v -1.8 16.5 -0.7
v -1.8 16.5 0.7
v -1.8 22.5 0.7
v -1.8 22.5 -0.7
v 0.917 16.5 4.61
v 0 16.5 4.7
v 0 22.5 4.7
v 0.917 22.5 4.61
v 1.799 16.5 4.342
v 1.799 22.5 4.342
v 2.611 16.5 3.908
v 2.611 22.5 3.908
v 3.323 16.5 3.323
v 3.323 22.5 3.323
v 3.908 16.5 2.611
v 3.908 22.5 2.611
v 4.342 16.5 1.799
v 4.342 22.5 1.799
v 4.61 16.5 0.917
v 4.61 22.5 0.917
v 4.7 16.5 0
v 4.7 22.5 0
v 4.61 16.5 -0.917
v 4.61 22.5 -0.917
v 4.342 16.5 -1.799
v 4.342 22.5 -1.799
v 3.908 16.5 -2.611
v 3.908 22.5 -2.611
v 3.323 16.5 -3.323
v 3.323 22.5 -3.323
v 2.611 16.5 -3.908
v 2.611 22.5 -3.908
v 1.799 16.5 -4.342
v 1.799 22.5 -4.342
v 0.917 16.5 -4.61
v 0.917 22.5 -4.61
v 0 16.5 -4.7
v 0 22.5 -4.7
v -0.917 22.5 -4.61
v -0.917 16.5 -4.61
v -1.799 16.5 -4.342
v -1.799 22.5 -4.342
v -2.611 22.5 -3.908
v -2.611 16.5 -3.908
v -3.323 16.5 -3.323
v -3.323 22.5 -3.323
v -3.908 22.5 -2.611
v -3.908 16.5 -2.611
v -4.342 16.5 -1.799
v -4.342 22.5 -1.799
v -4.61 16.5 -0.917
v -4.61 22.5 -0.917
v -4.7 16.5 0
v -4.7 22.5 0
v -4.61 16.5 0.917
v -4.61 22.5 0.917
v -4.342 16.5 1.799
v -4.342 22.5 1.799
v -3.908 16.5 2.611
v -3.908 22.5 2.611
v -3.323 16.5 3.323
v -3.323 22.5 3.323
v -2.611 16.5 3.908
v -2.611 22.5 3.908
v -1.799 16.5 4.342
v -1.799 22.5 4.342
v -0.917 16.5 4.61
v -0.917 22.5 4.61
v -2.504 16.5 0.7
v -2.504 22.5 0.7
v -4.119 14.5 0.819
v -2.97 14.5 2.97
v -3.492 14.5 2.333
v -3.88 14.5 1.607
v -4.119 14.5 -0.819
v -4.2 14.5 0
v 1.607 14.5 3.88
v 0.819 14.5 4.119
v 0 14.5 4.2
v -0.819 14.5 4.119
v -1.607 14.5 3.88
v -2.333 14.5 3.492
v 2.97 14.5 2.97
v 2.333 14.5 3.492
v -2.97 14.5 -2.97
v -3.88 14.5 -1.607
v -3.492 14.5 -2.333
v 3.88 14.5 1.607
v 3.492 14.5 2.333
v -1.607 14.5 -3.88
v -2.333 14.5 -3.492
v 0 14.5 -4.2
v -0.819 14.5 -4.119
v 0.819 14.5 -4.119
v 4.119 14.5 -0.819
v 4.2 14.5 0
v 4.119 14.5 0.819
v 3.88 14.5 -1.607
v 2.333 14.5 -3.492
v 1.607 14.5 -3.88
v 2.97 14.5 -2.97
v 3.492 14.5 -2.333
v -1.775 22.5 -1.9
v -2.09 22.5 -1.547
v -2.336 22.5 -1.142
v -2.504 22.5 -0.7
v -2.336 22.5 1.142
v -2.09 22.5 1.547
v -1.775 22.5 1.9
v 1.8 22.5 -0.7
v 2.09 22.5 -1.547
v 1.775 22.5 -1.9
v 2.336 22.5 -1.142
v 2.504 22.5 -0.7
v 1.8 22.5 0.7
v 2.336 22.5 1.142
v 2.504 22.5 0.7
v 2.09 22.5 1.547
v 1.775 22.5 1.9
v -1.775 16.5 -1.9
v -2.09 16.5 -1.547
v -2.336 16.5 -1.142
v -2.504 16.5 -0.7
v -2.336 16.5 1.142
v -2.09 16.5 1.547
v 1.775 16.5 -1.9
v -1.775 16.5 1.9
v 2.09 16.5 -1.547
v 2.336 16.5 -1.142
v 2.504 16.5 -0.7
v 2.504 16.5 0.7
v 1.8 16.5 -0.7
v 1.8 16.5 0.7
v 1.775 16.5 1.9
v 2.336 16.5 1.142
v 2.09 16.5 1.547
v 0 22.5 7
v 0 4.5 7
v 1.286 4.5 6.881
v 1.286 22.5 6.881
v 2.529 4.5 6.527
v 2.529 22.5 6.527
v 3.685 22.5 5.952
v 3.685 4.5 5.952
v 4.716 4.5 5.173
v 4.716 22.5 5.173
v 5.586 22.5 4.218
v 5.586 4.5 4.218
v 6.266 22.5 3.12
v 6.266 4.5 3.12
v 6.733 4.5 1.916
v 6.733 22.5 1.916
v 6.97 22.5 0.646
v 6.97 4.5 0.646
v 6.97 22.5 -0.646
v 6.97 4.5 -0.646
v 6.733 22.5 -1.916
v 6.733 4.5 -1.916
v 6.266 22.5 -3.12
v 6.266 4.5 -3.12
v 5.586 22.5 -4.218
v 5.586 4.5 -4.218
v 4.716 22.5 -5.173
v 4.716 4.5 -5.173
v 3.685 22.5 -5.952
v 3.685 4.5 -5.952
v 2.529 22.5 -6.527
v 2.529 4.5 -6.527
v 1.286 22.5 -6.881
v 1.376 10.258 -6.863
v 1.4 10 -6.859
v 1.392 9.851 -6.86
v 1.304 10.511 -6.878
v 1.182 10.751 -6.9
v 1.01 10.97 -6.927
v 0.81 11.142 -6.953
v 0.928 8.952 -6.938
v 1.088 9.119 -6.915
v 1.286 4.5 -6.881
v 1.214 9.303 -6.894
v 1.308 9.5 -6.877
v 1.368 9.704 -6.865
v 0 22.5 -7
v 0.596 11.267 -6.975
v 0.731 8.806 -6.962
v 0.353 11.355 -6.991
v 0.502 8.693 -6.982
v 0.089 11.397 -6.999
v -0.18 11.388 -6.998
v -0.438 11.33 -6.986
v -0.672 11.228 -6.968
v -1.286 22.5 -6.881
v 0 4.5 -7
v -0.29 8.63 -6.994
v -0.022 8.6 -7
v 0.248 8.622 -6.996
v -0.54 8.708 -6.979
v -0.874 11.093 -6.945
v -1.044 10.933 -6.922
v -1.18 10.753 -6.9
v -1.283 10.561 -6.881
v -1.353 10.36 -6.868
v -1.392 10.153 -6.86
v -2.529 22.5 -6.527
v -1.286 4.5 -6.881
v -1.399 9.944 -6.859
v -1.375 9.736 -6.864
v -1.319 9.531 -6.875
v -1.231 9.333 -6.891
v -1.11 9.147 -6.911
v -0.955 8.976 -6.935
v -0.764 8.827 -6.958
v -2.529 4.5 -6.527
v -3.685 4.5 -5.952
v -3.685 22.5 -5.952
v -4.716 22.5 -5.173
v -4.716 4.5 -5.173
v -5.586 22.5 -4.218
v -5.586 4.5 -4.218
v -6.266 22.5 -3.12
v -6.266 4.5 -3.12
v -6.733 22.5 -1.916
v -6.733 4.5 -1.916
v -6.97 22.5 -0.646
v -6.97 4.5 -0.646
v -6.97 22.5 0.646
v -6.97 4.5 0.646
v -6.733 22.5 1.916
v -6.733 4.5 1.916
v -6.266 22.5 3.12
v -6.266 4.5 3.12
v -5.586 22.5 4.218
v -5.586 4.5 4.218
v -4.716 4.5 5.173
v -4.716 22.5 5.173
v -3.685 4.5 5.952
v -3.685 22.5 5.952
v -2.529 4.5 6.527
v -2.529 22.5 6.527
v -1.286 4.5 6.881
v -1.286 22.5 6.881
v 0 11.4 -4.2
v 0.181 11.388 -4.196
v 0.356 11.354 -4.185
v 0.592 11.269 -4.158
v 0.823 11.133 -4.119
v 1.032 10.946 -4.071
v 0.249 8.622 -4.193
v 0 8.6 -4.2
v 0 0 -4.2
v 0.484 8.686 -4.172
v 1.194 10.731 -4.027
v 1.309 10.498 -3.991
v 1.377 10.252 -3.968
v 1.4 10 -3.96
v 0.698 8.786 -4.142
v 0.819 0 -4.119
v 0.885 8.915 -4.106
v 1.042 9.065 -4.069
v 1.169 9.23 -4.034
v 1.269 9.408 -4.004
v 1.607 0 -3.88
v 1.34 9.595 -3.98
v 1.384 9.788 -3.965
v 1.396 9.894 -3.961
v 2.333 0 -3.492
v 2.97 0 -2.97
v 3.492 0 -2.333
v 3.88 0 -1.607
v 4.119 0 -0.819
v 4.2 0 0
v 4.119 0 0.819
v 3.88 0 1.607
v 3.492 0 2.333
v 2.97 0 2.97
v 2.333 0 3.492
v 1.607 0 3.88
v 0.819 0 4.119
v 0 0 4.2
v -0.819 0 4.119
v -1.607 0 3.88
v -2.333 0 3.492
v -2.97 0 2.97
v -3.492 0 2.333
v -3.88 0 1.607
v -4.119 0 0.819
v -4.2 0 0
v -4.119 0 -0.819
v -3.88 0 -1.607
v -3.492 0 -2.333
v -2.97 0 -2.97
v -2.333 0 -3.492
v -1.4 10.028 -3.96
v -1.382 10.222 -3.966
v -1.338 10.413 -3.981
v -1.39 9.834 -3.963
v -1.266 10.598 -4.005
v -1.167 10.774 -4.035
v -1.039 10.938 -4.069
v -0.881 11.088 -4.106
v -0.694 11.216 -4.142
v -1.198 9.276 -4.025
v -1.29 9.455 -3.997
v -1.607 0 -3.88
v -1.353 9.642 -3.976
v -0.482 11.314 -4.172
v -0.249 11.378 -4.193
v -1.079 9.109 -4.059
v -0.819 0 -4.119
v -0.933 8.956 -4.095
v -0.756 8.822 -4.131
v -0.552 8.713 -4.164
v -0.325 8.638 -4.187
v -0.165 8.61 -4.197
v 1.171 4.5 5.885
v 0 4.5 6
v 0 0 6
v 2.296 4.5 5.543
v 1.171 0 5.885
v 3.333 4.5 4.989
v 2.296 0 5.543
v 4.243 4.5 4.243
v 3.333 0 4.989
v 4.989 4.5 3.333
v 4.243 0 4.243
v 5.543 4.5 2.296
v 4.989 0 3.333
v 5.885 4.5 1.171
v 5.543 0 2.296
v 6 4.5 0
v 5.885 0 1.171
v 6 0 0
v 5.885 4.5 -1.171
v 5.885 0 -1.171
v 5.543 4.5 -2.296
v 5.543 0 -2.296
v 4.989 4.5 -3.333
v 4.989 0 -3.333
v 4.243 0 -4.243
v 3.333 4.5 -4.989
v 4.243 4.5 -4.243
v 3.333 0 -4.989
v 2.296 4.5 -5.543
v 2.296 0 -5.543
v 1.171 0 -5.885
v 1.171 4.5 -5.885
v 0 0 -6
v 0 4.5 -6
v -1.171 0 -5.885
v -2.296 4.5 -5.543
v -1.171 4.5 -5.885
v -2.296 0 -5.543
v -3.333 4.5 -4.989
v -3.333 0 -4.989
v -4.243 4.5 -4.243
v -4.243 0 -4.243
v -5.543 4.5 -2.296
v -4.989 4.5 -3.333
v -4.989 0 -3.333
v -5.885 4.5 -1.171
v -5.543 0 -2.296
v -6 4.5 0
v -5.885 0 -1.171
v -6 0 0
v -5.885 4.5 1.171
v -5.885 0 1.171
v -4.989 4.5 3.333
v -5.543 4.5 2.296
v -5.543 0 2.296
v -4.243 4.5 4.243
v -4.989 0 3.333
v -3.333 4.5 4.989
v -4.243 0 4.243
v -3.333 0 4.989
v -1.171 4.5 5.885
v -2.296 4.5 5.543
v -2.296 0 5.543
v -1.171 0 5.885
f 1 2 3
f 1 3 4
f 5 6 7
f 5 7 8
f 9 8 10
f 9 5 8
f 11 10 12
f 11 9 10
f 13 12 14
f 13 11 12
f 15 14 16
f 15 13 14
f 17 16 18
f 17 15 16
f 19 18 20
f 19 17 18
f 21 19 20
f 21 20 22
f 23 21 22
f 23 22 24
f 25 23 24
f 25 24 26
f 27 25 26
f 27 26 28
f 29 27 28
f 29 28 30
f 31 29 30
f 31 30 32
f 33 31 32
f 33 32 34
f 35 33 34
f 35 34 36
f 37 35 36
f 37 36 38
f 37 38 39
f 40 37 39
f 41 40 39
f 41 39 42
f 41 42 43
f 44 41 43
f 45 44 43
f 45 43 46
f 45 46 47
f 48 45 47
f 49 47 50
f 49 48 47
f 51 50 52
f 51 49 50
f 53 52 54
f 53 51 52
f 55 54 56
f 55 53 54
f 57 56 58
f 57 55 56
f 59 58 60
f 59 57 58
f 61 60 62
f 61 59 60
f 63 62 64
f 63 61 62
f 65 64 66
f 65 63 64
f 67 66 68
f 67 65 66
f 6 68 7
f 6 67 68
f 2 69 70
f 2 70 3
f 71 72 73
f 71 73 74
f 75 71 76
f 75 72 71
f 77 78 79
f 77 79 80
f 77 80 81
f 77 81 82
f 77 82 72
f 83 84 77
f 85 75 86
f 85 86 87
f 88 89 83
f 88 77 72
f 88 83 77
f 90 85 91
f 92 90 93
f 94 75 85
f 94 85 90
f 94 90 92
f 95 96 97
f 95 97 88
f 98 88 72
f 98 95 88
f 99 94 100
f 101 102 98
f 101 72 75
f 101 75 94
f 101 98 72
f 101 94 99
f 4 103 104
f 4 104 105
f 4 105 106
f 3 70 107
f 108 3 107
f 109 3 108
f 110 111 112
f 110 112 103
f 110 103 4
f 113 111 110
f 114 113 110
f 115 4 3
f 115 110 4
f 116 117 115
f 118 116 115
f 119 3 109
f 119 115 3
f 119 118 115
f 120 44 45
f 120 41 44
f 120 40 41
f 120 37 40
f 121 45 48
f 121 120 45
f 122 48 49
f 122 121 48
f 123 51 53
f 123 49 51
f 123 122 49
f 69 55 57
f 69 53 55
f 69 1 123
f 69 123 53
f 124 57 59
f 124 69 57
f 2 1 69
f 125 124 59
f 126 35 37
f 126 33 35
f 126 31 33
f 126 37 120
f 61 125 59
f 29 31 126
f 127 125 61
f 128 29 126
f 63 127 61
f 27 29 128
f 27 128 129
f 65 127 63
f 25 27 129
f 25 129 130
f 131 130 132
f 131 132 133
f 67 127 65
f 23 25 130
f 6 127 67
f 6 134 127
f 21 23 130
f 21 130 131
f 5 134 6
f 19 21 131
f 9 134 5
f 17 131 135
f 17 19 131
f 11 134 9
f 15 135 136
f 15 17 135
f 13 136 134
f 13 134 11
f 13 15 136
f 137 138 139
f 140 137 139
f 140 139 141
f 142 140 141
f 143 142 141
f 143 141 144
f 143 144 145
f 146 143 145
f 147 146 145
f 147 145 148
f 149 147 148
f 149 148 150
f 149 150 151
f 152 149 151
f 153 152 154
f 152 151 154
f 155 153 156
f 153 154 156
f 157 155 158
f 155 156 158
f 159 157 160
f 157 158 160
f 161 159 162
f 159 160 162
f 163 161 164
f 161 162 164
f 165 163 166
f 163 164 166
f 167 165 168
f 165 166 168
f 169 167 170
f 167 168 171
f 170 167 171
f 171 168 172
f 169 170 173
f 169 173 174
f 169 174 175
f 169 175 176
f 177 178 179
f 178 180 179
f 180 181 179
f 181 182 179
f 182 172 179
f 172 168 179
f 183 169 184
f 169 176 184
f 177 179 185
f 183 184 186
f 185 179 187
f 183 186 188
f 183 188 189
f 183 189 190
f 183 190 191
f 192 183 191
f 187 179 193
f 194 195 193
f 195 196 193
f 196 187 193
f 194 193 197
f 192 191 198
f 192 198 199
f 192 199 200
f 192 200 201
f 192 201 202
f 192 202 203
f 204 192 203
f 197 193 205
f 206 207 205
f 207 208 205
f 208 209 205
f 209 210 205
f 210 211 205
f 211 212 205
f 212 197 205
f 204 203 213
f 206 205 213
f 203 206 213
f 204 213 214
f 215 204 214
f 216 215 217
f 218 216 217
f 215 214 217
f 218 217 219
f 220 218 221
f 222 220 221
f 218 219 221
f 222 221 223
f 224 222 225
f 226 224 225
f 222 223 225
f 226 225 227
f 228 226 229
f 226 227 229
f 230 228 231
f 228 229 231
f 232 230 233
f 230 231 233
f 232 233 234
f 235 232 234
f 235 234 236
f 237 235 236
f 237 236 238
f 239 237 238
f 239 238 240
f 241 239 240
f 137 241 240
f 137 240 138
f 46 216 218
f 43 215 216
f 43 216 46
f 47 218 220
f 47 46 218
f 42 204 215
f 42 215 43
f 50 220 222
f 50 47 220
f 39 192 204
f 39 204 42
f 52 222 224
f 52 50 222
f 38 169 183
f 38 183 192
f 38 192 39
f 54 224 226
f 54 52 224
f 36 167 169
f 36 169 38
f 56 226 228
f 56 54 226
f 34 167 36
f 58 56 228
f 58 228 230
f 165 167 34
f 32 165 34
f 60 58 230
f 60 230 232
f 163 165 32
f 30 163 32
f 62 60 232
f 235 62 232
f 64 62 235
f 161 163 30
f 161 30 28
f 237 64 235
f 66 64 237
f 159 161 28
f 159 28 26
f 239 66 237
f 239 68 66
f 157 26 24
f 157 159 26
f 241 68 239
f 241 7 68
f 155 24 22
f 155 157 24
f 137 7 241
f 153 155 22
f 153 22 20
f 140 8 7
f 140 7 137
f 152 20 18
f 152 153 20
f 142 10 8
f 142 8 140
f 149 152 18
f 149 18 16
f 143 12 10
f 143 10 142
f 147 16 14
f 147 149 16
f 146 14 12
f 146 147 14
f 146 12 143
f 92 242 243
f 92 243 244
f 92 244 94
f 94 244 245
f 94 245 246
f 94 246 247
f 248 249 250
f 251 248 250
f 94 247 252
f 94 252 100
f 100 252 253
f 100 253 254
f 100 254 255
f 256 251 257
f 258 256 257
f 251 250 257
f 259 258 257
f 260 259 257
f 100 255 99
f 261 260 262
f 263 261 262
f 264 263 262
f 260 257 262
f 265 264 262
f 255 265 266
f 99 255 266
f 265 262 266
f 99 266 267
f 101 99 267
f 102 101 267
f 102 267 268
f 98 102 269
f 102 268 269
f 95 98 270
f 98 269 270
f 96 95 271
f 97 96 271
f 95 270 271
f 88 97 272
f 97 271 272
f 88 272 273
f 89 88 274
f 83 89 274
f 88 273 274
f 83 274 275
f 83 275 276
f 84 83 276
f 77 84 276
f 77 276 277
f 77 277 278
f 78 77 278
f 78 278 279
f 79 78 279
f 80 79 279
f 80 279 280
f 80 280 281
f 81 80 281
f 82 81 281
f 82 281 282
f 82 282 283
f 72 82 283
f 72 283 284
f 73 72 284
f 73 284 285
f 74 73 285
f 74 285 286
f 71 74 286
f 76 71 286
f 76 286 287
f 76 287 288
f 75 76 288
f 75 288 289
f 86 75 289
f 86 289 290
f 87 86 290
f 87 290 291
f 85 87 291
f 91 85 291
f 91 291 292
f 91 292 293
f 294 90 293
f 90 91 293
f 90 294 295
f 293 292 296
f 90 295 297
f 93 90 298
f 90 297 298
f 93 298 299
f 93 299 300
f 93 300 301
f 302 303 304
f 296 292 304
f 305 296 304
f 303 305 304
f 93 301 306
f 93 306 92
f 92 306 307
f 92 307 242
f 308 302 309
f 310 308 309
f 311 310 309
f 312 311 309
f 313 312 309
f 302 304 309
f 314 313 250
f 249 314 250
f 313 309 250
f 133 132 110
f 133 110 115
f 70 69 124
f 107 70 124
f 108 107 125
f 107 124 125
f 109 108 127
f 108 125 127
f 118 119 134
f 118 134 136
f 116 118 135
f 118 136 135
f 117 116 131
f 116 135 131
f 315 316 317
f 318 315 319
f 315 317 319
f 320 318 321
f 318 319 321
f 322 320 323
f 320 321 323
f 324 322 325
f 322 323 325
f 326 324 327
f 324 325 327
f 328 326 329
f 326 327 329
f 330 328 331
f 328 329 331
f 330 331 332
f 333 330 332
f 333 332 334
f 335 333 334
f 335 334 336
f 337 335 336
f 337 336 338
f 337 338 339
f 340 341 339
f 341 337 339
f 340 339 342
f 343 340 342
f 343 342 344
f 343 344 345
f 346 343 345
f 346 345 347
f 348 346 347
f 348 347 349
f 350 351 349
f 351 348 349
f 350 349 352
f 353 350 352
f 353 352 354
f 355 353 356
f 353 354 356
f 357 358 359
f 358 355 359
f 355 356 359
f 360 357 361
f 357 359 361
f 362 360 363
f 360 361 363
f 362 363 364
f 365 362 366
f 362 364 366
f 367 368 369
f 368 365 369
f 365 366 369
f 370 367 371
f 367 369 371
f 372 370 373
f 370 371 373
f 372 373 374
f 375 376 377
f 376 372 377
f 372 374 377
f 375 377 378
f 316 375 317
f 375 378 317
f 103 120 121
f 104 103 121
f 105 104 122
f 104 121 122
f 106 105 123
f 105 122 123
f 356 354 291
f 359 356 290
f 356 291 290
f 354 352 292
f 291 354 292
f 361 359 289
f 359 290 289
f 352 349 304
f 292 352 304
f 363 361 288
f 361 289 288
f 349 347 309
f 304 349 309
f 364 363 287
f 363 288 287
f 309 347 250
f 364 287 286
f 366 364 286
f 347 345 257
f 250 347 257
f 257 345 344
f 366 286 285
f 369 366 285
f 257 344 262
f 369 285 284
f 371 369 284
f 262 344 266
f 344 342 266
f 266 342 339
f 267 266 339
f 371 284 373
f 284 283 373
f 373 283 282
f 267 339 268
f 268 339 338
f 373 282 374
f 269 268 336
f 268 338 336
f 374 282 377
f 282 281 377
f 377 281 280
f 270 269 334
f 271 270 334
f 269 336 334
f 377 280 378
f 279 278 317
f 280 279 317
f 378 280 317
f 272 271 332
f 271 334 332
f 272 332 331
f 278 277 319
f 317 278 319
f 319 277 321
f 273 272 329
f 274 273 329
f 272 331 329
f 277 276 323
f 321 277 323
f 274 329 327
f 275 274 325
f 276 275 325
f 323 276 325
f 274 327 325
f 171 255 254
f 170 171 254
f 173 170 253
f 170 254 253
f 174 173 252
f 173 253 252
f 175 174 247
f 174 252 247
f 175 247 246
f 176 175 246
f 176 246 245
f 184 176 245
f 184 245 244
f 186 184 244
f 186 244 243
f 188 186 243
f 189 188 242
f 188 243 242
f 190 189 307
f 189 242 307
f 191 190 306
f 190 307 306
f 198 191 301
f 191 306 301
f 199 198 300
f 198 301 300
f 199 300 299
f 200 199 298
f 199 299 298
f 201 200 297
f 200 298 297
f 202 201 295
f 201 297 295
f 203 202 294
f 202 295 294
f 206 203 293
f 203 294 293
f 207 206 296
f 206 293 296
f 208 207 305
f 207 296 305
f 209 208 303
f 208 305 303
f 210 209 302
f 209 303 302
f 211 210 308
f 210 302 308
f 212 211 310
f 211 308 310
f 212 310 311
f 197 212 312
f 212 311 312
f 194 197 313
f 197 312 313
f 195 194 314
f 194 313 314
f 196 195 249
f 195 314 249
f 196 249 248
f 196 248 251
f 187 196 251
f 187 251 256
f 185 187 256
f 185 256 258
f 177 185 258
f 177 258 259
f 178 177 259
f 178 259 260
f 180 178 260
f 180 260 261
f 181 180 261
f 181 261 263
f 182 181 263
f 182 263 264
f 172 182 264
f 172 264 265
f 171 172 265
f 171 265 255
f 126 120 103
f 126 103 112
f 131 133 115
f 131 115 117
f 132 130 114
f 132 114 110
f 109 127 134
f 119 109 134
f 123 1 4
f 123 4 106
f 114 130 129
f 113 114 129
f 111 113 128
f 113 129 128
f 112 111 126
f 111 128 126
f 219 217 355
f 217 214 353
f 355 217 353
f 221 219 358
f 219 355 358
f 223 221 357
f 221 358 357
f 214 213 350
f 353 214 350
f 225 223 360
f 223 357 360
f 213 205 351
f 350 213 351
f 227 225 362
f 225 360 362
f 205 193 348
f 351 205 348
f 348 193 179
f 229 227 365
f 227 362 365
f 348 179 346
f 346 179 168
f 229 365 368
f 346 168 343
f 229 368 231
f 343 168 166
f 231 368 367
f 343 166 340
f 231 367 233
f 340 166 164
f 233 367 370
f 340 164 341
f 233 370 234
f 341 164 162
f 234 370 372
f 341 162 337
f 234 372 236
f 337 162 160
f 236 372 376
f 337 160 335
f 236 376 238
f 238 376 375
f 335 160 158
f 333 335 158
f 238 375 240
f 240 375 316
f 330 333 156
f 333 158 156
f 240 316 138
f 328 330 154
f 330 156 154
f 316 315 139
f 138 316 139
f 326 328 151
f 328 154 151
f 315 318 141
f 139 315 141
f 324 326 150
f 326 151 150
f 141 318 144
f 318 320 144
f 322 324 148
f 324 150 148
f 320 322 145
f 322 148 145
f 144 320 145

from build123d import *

# Parameters (mm, degrees)
CROQUIS1_R                   = 6
SALIENTE_EXTRUIR1_DEPTH      = 16.5
CROQUIS2_R                   = 4.2
CORTAR_EXTRUIR1_DEPTH        = 14.5
CROQUIS3_R                   = 2.6
SALIENTE_EXTRUIR2_DEPTH      = 6
CORTAR_EXTRUIR4_START        = -6
CORTAR_EXTRUIR4_DEPTH        = 6
CORTAR_EXTRUIR5_START        = -6
CORTAR_EXTRUIR5_DEPTH        = 6
SALIENTE_EXTRUIR3_DEPTH      = 6
SALIENTE_EXTRUIR3_DEPTH_BACK = 12
CROQUIS13_R                  = 7
CROQUIS13_R_2                = 4.7
CORTAR_EXTRUIR9_REACH        = 26.581
CORTAR_EXTRUIR9_END_RADIUS   = 7
CROQUIS14_R                  = 1.4


with BuildPart() as part:
    # Croquis1 → Saliente-Extruir1 (new body)
    with BuildSketch(Plane(origin=(0, 0, 0), x_dir=(1, 0, 0), z_dir=(0, 1, 0))):
        with Locations(Location((0, 0, 0), (0, 0, 270))):
            Circle(CROQUIS1_R)
    extrude(amount=SALIENTE_EXTRUIR1_DEPTH)

    # Croquis2 → Cortar-Extruir1 (cut)
    with BuildSketch(Plane.XZ):
        with Locations(Location((0, 0, 0), (0, 0, 270))):
            Circle(CROQUIS2_R)
    extrude(amount=-CORTAR_EXTRUIR1_DEPTH, mode=Mode.SUBTRACT)

    # Croquis3 → Saliente-Extruir2 (add)
    with BuildSketch(Plane(origin=(0, 16.5, 0), x_dir=(1, 0, 0), z_dir=(0, 1, 0))):
        with Locations(Location((0, 0, 0), (0, 0, 270))):
            Circle(CROQUIS3_R)
    extrude(amount=SALIENTE_EXTRUIR2_DEPTH)

    # Croquis7 → Cortar-Extruir4 (cut)
    with BuildSketch(Plane(origin=(0, 22.5, 0), x_dir=(1, 0, 0), z_dir=(0, 1, 0)).offset(CORTAR_EXTRUIR4_START)):
        with BuildLine():
            Line((-1.774823935, -1.9), (1.774823935, -1.9))
            ThreePointArc((1.774823935, -1.9), (0, -2.6), (-1.774823935, -1.9))
        make_face()
        with BuildLine():
            Line((-1.774823935, 1.9), (1.774823935, 1.9))
            ThreePointArc((1.774823935, 1.9), (0, 2.6), (-1.774823935, 1.9))
        make_face()
    extrude(amount=CORTAR_EXTRUIR4_DEPTH, mode=Mode.SUBTRACT)

    # Croquis10 → Cortar-Extruir5 (cut)
    with BuildSketch(Plane(origin=(0, 22.5, 0), x_dir=(1, 0, 0), z_dir=(0, 1, 0)).offset(CORTAR_EXTRUIR5_START)):
        with BuildLine():
            Line((-1.8, 0.7), (-2.503996805, 0.7))
            ThreePointArc((-2.503996805, 0.7), (-2.6, 0), (-2.503996805, -0.7))
            Line((-2.503996805, -0.7), (-1.8, -0.7))
            Line((-1.8, -0.7), (-1.8, 0.7))
        make_face()
        with BuildLine():
            Line((2.503996805, 0.7), (1.8, 0.7))
            Line((1.8, 0.7), (1.8, -0.7))
            Line((1.8, -0.7), (2.503996805, -0.7))
            ThreePointArc((2.503996805, -0.7), (2.6, 0), (2.503996805, 0.7))
        make_face()
    extrude(amount=CORTAR_EXTRUIR5_DEPTH, mode=Mode.SUBTRACT)

    # Croquis13 → Saliente-Extruir3 (add, two sides: drawn at the far end of the back side and taken through both)
    with BuildSketch(Plane(origin=(0, 16.5, 0), x_dir=(1, 0, 0), z_dir=(0, 1, 0)).offset(-SALIENTE_EXTRUIR3_DEPTH_BACK)):
        with Locations(Location((0, 0, 0), (0, 0, 270))):
            Circle(CROQUIS13_R)
        with Locations(Location((0, 0, 0), (0, 0, 270))):
            Circle(CROQUIS13_R_2, mode=Mode.SUBTRACT)
    extrude(amount=SALIENTE_EXTRUIR3_DEPTH + SALIENTE_EXTRUIR3_DEPTH_BACK)

    # Cortar-Extruir9: up to this cylinder (the profile starts inside it)
    cortar_extruir9_end = Plane(origin=(0, 10, 0), z_dir=(0, 1, 0)) * Cylinder(CORTAR_EXTRUIR9_END_RADIUS, 68.162, mode=Mode.PRIVATE)
    # Croquis14 → Cortar-Extruir9 (cut, up to the surface)
    with BuildSketch(Plane.XY, mode=Mode.PRIVATE) as cortar_extruir9_sk1:
        with Locations((0, 10)):
            Circle(CROQUIS14_R)
    cortar_extruir9_tool1 = extrude(cortar_extruir9_sk1.sketch, amount=-CORTAR_EXTRUIR9_REACH, mode=Mode.PRIVATE) & cortar_extruir9_end
    add(cortar_extruir9_tool1.solids().sort_by_distance((0, 10, 0))[0], mode=Mode.SUBTRACT)


solid = part.part
